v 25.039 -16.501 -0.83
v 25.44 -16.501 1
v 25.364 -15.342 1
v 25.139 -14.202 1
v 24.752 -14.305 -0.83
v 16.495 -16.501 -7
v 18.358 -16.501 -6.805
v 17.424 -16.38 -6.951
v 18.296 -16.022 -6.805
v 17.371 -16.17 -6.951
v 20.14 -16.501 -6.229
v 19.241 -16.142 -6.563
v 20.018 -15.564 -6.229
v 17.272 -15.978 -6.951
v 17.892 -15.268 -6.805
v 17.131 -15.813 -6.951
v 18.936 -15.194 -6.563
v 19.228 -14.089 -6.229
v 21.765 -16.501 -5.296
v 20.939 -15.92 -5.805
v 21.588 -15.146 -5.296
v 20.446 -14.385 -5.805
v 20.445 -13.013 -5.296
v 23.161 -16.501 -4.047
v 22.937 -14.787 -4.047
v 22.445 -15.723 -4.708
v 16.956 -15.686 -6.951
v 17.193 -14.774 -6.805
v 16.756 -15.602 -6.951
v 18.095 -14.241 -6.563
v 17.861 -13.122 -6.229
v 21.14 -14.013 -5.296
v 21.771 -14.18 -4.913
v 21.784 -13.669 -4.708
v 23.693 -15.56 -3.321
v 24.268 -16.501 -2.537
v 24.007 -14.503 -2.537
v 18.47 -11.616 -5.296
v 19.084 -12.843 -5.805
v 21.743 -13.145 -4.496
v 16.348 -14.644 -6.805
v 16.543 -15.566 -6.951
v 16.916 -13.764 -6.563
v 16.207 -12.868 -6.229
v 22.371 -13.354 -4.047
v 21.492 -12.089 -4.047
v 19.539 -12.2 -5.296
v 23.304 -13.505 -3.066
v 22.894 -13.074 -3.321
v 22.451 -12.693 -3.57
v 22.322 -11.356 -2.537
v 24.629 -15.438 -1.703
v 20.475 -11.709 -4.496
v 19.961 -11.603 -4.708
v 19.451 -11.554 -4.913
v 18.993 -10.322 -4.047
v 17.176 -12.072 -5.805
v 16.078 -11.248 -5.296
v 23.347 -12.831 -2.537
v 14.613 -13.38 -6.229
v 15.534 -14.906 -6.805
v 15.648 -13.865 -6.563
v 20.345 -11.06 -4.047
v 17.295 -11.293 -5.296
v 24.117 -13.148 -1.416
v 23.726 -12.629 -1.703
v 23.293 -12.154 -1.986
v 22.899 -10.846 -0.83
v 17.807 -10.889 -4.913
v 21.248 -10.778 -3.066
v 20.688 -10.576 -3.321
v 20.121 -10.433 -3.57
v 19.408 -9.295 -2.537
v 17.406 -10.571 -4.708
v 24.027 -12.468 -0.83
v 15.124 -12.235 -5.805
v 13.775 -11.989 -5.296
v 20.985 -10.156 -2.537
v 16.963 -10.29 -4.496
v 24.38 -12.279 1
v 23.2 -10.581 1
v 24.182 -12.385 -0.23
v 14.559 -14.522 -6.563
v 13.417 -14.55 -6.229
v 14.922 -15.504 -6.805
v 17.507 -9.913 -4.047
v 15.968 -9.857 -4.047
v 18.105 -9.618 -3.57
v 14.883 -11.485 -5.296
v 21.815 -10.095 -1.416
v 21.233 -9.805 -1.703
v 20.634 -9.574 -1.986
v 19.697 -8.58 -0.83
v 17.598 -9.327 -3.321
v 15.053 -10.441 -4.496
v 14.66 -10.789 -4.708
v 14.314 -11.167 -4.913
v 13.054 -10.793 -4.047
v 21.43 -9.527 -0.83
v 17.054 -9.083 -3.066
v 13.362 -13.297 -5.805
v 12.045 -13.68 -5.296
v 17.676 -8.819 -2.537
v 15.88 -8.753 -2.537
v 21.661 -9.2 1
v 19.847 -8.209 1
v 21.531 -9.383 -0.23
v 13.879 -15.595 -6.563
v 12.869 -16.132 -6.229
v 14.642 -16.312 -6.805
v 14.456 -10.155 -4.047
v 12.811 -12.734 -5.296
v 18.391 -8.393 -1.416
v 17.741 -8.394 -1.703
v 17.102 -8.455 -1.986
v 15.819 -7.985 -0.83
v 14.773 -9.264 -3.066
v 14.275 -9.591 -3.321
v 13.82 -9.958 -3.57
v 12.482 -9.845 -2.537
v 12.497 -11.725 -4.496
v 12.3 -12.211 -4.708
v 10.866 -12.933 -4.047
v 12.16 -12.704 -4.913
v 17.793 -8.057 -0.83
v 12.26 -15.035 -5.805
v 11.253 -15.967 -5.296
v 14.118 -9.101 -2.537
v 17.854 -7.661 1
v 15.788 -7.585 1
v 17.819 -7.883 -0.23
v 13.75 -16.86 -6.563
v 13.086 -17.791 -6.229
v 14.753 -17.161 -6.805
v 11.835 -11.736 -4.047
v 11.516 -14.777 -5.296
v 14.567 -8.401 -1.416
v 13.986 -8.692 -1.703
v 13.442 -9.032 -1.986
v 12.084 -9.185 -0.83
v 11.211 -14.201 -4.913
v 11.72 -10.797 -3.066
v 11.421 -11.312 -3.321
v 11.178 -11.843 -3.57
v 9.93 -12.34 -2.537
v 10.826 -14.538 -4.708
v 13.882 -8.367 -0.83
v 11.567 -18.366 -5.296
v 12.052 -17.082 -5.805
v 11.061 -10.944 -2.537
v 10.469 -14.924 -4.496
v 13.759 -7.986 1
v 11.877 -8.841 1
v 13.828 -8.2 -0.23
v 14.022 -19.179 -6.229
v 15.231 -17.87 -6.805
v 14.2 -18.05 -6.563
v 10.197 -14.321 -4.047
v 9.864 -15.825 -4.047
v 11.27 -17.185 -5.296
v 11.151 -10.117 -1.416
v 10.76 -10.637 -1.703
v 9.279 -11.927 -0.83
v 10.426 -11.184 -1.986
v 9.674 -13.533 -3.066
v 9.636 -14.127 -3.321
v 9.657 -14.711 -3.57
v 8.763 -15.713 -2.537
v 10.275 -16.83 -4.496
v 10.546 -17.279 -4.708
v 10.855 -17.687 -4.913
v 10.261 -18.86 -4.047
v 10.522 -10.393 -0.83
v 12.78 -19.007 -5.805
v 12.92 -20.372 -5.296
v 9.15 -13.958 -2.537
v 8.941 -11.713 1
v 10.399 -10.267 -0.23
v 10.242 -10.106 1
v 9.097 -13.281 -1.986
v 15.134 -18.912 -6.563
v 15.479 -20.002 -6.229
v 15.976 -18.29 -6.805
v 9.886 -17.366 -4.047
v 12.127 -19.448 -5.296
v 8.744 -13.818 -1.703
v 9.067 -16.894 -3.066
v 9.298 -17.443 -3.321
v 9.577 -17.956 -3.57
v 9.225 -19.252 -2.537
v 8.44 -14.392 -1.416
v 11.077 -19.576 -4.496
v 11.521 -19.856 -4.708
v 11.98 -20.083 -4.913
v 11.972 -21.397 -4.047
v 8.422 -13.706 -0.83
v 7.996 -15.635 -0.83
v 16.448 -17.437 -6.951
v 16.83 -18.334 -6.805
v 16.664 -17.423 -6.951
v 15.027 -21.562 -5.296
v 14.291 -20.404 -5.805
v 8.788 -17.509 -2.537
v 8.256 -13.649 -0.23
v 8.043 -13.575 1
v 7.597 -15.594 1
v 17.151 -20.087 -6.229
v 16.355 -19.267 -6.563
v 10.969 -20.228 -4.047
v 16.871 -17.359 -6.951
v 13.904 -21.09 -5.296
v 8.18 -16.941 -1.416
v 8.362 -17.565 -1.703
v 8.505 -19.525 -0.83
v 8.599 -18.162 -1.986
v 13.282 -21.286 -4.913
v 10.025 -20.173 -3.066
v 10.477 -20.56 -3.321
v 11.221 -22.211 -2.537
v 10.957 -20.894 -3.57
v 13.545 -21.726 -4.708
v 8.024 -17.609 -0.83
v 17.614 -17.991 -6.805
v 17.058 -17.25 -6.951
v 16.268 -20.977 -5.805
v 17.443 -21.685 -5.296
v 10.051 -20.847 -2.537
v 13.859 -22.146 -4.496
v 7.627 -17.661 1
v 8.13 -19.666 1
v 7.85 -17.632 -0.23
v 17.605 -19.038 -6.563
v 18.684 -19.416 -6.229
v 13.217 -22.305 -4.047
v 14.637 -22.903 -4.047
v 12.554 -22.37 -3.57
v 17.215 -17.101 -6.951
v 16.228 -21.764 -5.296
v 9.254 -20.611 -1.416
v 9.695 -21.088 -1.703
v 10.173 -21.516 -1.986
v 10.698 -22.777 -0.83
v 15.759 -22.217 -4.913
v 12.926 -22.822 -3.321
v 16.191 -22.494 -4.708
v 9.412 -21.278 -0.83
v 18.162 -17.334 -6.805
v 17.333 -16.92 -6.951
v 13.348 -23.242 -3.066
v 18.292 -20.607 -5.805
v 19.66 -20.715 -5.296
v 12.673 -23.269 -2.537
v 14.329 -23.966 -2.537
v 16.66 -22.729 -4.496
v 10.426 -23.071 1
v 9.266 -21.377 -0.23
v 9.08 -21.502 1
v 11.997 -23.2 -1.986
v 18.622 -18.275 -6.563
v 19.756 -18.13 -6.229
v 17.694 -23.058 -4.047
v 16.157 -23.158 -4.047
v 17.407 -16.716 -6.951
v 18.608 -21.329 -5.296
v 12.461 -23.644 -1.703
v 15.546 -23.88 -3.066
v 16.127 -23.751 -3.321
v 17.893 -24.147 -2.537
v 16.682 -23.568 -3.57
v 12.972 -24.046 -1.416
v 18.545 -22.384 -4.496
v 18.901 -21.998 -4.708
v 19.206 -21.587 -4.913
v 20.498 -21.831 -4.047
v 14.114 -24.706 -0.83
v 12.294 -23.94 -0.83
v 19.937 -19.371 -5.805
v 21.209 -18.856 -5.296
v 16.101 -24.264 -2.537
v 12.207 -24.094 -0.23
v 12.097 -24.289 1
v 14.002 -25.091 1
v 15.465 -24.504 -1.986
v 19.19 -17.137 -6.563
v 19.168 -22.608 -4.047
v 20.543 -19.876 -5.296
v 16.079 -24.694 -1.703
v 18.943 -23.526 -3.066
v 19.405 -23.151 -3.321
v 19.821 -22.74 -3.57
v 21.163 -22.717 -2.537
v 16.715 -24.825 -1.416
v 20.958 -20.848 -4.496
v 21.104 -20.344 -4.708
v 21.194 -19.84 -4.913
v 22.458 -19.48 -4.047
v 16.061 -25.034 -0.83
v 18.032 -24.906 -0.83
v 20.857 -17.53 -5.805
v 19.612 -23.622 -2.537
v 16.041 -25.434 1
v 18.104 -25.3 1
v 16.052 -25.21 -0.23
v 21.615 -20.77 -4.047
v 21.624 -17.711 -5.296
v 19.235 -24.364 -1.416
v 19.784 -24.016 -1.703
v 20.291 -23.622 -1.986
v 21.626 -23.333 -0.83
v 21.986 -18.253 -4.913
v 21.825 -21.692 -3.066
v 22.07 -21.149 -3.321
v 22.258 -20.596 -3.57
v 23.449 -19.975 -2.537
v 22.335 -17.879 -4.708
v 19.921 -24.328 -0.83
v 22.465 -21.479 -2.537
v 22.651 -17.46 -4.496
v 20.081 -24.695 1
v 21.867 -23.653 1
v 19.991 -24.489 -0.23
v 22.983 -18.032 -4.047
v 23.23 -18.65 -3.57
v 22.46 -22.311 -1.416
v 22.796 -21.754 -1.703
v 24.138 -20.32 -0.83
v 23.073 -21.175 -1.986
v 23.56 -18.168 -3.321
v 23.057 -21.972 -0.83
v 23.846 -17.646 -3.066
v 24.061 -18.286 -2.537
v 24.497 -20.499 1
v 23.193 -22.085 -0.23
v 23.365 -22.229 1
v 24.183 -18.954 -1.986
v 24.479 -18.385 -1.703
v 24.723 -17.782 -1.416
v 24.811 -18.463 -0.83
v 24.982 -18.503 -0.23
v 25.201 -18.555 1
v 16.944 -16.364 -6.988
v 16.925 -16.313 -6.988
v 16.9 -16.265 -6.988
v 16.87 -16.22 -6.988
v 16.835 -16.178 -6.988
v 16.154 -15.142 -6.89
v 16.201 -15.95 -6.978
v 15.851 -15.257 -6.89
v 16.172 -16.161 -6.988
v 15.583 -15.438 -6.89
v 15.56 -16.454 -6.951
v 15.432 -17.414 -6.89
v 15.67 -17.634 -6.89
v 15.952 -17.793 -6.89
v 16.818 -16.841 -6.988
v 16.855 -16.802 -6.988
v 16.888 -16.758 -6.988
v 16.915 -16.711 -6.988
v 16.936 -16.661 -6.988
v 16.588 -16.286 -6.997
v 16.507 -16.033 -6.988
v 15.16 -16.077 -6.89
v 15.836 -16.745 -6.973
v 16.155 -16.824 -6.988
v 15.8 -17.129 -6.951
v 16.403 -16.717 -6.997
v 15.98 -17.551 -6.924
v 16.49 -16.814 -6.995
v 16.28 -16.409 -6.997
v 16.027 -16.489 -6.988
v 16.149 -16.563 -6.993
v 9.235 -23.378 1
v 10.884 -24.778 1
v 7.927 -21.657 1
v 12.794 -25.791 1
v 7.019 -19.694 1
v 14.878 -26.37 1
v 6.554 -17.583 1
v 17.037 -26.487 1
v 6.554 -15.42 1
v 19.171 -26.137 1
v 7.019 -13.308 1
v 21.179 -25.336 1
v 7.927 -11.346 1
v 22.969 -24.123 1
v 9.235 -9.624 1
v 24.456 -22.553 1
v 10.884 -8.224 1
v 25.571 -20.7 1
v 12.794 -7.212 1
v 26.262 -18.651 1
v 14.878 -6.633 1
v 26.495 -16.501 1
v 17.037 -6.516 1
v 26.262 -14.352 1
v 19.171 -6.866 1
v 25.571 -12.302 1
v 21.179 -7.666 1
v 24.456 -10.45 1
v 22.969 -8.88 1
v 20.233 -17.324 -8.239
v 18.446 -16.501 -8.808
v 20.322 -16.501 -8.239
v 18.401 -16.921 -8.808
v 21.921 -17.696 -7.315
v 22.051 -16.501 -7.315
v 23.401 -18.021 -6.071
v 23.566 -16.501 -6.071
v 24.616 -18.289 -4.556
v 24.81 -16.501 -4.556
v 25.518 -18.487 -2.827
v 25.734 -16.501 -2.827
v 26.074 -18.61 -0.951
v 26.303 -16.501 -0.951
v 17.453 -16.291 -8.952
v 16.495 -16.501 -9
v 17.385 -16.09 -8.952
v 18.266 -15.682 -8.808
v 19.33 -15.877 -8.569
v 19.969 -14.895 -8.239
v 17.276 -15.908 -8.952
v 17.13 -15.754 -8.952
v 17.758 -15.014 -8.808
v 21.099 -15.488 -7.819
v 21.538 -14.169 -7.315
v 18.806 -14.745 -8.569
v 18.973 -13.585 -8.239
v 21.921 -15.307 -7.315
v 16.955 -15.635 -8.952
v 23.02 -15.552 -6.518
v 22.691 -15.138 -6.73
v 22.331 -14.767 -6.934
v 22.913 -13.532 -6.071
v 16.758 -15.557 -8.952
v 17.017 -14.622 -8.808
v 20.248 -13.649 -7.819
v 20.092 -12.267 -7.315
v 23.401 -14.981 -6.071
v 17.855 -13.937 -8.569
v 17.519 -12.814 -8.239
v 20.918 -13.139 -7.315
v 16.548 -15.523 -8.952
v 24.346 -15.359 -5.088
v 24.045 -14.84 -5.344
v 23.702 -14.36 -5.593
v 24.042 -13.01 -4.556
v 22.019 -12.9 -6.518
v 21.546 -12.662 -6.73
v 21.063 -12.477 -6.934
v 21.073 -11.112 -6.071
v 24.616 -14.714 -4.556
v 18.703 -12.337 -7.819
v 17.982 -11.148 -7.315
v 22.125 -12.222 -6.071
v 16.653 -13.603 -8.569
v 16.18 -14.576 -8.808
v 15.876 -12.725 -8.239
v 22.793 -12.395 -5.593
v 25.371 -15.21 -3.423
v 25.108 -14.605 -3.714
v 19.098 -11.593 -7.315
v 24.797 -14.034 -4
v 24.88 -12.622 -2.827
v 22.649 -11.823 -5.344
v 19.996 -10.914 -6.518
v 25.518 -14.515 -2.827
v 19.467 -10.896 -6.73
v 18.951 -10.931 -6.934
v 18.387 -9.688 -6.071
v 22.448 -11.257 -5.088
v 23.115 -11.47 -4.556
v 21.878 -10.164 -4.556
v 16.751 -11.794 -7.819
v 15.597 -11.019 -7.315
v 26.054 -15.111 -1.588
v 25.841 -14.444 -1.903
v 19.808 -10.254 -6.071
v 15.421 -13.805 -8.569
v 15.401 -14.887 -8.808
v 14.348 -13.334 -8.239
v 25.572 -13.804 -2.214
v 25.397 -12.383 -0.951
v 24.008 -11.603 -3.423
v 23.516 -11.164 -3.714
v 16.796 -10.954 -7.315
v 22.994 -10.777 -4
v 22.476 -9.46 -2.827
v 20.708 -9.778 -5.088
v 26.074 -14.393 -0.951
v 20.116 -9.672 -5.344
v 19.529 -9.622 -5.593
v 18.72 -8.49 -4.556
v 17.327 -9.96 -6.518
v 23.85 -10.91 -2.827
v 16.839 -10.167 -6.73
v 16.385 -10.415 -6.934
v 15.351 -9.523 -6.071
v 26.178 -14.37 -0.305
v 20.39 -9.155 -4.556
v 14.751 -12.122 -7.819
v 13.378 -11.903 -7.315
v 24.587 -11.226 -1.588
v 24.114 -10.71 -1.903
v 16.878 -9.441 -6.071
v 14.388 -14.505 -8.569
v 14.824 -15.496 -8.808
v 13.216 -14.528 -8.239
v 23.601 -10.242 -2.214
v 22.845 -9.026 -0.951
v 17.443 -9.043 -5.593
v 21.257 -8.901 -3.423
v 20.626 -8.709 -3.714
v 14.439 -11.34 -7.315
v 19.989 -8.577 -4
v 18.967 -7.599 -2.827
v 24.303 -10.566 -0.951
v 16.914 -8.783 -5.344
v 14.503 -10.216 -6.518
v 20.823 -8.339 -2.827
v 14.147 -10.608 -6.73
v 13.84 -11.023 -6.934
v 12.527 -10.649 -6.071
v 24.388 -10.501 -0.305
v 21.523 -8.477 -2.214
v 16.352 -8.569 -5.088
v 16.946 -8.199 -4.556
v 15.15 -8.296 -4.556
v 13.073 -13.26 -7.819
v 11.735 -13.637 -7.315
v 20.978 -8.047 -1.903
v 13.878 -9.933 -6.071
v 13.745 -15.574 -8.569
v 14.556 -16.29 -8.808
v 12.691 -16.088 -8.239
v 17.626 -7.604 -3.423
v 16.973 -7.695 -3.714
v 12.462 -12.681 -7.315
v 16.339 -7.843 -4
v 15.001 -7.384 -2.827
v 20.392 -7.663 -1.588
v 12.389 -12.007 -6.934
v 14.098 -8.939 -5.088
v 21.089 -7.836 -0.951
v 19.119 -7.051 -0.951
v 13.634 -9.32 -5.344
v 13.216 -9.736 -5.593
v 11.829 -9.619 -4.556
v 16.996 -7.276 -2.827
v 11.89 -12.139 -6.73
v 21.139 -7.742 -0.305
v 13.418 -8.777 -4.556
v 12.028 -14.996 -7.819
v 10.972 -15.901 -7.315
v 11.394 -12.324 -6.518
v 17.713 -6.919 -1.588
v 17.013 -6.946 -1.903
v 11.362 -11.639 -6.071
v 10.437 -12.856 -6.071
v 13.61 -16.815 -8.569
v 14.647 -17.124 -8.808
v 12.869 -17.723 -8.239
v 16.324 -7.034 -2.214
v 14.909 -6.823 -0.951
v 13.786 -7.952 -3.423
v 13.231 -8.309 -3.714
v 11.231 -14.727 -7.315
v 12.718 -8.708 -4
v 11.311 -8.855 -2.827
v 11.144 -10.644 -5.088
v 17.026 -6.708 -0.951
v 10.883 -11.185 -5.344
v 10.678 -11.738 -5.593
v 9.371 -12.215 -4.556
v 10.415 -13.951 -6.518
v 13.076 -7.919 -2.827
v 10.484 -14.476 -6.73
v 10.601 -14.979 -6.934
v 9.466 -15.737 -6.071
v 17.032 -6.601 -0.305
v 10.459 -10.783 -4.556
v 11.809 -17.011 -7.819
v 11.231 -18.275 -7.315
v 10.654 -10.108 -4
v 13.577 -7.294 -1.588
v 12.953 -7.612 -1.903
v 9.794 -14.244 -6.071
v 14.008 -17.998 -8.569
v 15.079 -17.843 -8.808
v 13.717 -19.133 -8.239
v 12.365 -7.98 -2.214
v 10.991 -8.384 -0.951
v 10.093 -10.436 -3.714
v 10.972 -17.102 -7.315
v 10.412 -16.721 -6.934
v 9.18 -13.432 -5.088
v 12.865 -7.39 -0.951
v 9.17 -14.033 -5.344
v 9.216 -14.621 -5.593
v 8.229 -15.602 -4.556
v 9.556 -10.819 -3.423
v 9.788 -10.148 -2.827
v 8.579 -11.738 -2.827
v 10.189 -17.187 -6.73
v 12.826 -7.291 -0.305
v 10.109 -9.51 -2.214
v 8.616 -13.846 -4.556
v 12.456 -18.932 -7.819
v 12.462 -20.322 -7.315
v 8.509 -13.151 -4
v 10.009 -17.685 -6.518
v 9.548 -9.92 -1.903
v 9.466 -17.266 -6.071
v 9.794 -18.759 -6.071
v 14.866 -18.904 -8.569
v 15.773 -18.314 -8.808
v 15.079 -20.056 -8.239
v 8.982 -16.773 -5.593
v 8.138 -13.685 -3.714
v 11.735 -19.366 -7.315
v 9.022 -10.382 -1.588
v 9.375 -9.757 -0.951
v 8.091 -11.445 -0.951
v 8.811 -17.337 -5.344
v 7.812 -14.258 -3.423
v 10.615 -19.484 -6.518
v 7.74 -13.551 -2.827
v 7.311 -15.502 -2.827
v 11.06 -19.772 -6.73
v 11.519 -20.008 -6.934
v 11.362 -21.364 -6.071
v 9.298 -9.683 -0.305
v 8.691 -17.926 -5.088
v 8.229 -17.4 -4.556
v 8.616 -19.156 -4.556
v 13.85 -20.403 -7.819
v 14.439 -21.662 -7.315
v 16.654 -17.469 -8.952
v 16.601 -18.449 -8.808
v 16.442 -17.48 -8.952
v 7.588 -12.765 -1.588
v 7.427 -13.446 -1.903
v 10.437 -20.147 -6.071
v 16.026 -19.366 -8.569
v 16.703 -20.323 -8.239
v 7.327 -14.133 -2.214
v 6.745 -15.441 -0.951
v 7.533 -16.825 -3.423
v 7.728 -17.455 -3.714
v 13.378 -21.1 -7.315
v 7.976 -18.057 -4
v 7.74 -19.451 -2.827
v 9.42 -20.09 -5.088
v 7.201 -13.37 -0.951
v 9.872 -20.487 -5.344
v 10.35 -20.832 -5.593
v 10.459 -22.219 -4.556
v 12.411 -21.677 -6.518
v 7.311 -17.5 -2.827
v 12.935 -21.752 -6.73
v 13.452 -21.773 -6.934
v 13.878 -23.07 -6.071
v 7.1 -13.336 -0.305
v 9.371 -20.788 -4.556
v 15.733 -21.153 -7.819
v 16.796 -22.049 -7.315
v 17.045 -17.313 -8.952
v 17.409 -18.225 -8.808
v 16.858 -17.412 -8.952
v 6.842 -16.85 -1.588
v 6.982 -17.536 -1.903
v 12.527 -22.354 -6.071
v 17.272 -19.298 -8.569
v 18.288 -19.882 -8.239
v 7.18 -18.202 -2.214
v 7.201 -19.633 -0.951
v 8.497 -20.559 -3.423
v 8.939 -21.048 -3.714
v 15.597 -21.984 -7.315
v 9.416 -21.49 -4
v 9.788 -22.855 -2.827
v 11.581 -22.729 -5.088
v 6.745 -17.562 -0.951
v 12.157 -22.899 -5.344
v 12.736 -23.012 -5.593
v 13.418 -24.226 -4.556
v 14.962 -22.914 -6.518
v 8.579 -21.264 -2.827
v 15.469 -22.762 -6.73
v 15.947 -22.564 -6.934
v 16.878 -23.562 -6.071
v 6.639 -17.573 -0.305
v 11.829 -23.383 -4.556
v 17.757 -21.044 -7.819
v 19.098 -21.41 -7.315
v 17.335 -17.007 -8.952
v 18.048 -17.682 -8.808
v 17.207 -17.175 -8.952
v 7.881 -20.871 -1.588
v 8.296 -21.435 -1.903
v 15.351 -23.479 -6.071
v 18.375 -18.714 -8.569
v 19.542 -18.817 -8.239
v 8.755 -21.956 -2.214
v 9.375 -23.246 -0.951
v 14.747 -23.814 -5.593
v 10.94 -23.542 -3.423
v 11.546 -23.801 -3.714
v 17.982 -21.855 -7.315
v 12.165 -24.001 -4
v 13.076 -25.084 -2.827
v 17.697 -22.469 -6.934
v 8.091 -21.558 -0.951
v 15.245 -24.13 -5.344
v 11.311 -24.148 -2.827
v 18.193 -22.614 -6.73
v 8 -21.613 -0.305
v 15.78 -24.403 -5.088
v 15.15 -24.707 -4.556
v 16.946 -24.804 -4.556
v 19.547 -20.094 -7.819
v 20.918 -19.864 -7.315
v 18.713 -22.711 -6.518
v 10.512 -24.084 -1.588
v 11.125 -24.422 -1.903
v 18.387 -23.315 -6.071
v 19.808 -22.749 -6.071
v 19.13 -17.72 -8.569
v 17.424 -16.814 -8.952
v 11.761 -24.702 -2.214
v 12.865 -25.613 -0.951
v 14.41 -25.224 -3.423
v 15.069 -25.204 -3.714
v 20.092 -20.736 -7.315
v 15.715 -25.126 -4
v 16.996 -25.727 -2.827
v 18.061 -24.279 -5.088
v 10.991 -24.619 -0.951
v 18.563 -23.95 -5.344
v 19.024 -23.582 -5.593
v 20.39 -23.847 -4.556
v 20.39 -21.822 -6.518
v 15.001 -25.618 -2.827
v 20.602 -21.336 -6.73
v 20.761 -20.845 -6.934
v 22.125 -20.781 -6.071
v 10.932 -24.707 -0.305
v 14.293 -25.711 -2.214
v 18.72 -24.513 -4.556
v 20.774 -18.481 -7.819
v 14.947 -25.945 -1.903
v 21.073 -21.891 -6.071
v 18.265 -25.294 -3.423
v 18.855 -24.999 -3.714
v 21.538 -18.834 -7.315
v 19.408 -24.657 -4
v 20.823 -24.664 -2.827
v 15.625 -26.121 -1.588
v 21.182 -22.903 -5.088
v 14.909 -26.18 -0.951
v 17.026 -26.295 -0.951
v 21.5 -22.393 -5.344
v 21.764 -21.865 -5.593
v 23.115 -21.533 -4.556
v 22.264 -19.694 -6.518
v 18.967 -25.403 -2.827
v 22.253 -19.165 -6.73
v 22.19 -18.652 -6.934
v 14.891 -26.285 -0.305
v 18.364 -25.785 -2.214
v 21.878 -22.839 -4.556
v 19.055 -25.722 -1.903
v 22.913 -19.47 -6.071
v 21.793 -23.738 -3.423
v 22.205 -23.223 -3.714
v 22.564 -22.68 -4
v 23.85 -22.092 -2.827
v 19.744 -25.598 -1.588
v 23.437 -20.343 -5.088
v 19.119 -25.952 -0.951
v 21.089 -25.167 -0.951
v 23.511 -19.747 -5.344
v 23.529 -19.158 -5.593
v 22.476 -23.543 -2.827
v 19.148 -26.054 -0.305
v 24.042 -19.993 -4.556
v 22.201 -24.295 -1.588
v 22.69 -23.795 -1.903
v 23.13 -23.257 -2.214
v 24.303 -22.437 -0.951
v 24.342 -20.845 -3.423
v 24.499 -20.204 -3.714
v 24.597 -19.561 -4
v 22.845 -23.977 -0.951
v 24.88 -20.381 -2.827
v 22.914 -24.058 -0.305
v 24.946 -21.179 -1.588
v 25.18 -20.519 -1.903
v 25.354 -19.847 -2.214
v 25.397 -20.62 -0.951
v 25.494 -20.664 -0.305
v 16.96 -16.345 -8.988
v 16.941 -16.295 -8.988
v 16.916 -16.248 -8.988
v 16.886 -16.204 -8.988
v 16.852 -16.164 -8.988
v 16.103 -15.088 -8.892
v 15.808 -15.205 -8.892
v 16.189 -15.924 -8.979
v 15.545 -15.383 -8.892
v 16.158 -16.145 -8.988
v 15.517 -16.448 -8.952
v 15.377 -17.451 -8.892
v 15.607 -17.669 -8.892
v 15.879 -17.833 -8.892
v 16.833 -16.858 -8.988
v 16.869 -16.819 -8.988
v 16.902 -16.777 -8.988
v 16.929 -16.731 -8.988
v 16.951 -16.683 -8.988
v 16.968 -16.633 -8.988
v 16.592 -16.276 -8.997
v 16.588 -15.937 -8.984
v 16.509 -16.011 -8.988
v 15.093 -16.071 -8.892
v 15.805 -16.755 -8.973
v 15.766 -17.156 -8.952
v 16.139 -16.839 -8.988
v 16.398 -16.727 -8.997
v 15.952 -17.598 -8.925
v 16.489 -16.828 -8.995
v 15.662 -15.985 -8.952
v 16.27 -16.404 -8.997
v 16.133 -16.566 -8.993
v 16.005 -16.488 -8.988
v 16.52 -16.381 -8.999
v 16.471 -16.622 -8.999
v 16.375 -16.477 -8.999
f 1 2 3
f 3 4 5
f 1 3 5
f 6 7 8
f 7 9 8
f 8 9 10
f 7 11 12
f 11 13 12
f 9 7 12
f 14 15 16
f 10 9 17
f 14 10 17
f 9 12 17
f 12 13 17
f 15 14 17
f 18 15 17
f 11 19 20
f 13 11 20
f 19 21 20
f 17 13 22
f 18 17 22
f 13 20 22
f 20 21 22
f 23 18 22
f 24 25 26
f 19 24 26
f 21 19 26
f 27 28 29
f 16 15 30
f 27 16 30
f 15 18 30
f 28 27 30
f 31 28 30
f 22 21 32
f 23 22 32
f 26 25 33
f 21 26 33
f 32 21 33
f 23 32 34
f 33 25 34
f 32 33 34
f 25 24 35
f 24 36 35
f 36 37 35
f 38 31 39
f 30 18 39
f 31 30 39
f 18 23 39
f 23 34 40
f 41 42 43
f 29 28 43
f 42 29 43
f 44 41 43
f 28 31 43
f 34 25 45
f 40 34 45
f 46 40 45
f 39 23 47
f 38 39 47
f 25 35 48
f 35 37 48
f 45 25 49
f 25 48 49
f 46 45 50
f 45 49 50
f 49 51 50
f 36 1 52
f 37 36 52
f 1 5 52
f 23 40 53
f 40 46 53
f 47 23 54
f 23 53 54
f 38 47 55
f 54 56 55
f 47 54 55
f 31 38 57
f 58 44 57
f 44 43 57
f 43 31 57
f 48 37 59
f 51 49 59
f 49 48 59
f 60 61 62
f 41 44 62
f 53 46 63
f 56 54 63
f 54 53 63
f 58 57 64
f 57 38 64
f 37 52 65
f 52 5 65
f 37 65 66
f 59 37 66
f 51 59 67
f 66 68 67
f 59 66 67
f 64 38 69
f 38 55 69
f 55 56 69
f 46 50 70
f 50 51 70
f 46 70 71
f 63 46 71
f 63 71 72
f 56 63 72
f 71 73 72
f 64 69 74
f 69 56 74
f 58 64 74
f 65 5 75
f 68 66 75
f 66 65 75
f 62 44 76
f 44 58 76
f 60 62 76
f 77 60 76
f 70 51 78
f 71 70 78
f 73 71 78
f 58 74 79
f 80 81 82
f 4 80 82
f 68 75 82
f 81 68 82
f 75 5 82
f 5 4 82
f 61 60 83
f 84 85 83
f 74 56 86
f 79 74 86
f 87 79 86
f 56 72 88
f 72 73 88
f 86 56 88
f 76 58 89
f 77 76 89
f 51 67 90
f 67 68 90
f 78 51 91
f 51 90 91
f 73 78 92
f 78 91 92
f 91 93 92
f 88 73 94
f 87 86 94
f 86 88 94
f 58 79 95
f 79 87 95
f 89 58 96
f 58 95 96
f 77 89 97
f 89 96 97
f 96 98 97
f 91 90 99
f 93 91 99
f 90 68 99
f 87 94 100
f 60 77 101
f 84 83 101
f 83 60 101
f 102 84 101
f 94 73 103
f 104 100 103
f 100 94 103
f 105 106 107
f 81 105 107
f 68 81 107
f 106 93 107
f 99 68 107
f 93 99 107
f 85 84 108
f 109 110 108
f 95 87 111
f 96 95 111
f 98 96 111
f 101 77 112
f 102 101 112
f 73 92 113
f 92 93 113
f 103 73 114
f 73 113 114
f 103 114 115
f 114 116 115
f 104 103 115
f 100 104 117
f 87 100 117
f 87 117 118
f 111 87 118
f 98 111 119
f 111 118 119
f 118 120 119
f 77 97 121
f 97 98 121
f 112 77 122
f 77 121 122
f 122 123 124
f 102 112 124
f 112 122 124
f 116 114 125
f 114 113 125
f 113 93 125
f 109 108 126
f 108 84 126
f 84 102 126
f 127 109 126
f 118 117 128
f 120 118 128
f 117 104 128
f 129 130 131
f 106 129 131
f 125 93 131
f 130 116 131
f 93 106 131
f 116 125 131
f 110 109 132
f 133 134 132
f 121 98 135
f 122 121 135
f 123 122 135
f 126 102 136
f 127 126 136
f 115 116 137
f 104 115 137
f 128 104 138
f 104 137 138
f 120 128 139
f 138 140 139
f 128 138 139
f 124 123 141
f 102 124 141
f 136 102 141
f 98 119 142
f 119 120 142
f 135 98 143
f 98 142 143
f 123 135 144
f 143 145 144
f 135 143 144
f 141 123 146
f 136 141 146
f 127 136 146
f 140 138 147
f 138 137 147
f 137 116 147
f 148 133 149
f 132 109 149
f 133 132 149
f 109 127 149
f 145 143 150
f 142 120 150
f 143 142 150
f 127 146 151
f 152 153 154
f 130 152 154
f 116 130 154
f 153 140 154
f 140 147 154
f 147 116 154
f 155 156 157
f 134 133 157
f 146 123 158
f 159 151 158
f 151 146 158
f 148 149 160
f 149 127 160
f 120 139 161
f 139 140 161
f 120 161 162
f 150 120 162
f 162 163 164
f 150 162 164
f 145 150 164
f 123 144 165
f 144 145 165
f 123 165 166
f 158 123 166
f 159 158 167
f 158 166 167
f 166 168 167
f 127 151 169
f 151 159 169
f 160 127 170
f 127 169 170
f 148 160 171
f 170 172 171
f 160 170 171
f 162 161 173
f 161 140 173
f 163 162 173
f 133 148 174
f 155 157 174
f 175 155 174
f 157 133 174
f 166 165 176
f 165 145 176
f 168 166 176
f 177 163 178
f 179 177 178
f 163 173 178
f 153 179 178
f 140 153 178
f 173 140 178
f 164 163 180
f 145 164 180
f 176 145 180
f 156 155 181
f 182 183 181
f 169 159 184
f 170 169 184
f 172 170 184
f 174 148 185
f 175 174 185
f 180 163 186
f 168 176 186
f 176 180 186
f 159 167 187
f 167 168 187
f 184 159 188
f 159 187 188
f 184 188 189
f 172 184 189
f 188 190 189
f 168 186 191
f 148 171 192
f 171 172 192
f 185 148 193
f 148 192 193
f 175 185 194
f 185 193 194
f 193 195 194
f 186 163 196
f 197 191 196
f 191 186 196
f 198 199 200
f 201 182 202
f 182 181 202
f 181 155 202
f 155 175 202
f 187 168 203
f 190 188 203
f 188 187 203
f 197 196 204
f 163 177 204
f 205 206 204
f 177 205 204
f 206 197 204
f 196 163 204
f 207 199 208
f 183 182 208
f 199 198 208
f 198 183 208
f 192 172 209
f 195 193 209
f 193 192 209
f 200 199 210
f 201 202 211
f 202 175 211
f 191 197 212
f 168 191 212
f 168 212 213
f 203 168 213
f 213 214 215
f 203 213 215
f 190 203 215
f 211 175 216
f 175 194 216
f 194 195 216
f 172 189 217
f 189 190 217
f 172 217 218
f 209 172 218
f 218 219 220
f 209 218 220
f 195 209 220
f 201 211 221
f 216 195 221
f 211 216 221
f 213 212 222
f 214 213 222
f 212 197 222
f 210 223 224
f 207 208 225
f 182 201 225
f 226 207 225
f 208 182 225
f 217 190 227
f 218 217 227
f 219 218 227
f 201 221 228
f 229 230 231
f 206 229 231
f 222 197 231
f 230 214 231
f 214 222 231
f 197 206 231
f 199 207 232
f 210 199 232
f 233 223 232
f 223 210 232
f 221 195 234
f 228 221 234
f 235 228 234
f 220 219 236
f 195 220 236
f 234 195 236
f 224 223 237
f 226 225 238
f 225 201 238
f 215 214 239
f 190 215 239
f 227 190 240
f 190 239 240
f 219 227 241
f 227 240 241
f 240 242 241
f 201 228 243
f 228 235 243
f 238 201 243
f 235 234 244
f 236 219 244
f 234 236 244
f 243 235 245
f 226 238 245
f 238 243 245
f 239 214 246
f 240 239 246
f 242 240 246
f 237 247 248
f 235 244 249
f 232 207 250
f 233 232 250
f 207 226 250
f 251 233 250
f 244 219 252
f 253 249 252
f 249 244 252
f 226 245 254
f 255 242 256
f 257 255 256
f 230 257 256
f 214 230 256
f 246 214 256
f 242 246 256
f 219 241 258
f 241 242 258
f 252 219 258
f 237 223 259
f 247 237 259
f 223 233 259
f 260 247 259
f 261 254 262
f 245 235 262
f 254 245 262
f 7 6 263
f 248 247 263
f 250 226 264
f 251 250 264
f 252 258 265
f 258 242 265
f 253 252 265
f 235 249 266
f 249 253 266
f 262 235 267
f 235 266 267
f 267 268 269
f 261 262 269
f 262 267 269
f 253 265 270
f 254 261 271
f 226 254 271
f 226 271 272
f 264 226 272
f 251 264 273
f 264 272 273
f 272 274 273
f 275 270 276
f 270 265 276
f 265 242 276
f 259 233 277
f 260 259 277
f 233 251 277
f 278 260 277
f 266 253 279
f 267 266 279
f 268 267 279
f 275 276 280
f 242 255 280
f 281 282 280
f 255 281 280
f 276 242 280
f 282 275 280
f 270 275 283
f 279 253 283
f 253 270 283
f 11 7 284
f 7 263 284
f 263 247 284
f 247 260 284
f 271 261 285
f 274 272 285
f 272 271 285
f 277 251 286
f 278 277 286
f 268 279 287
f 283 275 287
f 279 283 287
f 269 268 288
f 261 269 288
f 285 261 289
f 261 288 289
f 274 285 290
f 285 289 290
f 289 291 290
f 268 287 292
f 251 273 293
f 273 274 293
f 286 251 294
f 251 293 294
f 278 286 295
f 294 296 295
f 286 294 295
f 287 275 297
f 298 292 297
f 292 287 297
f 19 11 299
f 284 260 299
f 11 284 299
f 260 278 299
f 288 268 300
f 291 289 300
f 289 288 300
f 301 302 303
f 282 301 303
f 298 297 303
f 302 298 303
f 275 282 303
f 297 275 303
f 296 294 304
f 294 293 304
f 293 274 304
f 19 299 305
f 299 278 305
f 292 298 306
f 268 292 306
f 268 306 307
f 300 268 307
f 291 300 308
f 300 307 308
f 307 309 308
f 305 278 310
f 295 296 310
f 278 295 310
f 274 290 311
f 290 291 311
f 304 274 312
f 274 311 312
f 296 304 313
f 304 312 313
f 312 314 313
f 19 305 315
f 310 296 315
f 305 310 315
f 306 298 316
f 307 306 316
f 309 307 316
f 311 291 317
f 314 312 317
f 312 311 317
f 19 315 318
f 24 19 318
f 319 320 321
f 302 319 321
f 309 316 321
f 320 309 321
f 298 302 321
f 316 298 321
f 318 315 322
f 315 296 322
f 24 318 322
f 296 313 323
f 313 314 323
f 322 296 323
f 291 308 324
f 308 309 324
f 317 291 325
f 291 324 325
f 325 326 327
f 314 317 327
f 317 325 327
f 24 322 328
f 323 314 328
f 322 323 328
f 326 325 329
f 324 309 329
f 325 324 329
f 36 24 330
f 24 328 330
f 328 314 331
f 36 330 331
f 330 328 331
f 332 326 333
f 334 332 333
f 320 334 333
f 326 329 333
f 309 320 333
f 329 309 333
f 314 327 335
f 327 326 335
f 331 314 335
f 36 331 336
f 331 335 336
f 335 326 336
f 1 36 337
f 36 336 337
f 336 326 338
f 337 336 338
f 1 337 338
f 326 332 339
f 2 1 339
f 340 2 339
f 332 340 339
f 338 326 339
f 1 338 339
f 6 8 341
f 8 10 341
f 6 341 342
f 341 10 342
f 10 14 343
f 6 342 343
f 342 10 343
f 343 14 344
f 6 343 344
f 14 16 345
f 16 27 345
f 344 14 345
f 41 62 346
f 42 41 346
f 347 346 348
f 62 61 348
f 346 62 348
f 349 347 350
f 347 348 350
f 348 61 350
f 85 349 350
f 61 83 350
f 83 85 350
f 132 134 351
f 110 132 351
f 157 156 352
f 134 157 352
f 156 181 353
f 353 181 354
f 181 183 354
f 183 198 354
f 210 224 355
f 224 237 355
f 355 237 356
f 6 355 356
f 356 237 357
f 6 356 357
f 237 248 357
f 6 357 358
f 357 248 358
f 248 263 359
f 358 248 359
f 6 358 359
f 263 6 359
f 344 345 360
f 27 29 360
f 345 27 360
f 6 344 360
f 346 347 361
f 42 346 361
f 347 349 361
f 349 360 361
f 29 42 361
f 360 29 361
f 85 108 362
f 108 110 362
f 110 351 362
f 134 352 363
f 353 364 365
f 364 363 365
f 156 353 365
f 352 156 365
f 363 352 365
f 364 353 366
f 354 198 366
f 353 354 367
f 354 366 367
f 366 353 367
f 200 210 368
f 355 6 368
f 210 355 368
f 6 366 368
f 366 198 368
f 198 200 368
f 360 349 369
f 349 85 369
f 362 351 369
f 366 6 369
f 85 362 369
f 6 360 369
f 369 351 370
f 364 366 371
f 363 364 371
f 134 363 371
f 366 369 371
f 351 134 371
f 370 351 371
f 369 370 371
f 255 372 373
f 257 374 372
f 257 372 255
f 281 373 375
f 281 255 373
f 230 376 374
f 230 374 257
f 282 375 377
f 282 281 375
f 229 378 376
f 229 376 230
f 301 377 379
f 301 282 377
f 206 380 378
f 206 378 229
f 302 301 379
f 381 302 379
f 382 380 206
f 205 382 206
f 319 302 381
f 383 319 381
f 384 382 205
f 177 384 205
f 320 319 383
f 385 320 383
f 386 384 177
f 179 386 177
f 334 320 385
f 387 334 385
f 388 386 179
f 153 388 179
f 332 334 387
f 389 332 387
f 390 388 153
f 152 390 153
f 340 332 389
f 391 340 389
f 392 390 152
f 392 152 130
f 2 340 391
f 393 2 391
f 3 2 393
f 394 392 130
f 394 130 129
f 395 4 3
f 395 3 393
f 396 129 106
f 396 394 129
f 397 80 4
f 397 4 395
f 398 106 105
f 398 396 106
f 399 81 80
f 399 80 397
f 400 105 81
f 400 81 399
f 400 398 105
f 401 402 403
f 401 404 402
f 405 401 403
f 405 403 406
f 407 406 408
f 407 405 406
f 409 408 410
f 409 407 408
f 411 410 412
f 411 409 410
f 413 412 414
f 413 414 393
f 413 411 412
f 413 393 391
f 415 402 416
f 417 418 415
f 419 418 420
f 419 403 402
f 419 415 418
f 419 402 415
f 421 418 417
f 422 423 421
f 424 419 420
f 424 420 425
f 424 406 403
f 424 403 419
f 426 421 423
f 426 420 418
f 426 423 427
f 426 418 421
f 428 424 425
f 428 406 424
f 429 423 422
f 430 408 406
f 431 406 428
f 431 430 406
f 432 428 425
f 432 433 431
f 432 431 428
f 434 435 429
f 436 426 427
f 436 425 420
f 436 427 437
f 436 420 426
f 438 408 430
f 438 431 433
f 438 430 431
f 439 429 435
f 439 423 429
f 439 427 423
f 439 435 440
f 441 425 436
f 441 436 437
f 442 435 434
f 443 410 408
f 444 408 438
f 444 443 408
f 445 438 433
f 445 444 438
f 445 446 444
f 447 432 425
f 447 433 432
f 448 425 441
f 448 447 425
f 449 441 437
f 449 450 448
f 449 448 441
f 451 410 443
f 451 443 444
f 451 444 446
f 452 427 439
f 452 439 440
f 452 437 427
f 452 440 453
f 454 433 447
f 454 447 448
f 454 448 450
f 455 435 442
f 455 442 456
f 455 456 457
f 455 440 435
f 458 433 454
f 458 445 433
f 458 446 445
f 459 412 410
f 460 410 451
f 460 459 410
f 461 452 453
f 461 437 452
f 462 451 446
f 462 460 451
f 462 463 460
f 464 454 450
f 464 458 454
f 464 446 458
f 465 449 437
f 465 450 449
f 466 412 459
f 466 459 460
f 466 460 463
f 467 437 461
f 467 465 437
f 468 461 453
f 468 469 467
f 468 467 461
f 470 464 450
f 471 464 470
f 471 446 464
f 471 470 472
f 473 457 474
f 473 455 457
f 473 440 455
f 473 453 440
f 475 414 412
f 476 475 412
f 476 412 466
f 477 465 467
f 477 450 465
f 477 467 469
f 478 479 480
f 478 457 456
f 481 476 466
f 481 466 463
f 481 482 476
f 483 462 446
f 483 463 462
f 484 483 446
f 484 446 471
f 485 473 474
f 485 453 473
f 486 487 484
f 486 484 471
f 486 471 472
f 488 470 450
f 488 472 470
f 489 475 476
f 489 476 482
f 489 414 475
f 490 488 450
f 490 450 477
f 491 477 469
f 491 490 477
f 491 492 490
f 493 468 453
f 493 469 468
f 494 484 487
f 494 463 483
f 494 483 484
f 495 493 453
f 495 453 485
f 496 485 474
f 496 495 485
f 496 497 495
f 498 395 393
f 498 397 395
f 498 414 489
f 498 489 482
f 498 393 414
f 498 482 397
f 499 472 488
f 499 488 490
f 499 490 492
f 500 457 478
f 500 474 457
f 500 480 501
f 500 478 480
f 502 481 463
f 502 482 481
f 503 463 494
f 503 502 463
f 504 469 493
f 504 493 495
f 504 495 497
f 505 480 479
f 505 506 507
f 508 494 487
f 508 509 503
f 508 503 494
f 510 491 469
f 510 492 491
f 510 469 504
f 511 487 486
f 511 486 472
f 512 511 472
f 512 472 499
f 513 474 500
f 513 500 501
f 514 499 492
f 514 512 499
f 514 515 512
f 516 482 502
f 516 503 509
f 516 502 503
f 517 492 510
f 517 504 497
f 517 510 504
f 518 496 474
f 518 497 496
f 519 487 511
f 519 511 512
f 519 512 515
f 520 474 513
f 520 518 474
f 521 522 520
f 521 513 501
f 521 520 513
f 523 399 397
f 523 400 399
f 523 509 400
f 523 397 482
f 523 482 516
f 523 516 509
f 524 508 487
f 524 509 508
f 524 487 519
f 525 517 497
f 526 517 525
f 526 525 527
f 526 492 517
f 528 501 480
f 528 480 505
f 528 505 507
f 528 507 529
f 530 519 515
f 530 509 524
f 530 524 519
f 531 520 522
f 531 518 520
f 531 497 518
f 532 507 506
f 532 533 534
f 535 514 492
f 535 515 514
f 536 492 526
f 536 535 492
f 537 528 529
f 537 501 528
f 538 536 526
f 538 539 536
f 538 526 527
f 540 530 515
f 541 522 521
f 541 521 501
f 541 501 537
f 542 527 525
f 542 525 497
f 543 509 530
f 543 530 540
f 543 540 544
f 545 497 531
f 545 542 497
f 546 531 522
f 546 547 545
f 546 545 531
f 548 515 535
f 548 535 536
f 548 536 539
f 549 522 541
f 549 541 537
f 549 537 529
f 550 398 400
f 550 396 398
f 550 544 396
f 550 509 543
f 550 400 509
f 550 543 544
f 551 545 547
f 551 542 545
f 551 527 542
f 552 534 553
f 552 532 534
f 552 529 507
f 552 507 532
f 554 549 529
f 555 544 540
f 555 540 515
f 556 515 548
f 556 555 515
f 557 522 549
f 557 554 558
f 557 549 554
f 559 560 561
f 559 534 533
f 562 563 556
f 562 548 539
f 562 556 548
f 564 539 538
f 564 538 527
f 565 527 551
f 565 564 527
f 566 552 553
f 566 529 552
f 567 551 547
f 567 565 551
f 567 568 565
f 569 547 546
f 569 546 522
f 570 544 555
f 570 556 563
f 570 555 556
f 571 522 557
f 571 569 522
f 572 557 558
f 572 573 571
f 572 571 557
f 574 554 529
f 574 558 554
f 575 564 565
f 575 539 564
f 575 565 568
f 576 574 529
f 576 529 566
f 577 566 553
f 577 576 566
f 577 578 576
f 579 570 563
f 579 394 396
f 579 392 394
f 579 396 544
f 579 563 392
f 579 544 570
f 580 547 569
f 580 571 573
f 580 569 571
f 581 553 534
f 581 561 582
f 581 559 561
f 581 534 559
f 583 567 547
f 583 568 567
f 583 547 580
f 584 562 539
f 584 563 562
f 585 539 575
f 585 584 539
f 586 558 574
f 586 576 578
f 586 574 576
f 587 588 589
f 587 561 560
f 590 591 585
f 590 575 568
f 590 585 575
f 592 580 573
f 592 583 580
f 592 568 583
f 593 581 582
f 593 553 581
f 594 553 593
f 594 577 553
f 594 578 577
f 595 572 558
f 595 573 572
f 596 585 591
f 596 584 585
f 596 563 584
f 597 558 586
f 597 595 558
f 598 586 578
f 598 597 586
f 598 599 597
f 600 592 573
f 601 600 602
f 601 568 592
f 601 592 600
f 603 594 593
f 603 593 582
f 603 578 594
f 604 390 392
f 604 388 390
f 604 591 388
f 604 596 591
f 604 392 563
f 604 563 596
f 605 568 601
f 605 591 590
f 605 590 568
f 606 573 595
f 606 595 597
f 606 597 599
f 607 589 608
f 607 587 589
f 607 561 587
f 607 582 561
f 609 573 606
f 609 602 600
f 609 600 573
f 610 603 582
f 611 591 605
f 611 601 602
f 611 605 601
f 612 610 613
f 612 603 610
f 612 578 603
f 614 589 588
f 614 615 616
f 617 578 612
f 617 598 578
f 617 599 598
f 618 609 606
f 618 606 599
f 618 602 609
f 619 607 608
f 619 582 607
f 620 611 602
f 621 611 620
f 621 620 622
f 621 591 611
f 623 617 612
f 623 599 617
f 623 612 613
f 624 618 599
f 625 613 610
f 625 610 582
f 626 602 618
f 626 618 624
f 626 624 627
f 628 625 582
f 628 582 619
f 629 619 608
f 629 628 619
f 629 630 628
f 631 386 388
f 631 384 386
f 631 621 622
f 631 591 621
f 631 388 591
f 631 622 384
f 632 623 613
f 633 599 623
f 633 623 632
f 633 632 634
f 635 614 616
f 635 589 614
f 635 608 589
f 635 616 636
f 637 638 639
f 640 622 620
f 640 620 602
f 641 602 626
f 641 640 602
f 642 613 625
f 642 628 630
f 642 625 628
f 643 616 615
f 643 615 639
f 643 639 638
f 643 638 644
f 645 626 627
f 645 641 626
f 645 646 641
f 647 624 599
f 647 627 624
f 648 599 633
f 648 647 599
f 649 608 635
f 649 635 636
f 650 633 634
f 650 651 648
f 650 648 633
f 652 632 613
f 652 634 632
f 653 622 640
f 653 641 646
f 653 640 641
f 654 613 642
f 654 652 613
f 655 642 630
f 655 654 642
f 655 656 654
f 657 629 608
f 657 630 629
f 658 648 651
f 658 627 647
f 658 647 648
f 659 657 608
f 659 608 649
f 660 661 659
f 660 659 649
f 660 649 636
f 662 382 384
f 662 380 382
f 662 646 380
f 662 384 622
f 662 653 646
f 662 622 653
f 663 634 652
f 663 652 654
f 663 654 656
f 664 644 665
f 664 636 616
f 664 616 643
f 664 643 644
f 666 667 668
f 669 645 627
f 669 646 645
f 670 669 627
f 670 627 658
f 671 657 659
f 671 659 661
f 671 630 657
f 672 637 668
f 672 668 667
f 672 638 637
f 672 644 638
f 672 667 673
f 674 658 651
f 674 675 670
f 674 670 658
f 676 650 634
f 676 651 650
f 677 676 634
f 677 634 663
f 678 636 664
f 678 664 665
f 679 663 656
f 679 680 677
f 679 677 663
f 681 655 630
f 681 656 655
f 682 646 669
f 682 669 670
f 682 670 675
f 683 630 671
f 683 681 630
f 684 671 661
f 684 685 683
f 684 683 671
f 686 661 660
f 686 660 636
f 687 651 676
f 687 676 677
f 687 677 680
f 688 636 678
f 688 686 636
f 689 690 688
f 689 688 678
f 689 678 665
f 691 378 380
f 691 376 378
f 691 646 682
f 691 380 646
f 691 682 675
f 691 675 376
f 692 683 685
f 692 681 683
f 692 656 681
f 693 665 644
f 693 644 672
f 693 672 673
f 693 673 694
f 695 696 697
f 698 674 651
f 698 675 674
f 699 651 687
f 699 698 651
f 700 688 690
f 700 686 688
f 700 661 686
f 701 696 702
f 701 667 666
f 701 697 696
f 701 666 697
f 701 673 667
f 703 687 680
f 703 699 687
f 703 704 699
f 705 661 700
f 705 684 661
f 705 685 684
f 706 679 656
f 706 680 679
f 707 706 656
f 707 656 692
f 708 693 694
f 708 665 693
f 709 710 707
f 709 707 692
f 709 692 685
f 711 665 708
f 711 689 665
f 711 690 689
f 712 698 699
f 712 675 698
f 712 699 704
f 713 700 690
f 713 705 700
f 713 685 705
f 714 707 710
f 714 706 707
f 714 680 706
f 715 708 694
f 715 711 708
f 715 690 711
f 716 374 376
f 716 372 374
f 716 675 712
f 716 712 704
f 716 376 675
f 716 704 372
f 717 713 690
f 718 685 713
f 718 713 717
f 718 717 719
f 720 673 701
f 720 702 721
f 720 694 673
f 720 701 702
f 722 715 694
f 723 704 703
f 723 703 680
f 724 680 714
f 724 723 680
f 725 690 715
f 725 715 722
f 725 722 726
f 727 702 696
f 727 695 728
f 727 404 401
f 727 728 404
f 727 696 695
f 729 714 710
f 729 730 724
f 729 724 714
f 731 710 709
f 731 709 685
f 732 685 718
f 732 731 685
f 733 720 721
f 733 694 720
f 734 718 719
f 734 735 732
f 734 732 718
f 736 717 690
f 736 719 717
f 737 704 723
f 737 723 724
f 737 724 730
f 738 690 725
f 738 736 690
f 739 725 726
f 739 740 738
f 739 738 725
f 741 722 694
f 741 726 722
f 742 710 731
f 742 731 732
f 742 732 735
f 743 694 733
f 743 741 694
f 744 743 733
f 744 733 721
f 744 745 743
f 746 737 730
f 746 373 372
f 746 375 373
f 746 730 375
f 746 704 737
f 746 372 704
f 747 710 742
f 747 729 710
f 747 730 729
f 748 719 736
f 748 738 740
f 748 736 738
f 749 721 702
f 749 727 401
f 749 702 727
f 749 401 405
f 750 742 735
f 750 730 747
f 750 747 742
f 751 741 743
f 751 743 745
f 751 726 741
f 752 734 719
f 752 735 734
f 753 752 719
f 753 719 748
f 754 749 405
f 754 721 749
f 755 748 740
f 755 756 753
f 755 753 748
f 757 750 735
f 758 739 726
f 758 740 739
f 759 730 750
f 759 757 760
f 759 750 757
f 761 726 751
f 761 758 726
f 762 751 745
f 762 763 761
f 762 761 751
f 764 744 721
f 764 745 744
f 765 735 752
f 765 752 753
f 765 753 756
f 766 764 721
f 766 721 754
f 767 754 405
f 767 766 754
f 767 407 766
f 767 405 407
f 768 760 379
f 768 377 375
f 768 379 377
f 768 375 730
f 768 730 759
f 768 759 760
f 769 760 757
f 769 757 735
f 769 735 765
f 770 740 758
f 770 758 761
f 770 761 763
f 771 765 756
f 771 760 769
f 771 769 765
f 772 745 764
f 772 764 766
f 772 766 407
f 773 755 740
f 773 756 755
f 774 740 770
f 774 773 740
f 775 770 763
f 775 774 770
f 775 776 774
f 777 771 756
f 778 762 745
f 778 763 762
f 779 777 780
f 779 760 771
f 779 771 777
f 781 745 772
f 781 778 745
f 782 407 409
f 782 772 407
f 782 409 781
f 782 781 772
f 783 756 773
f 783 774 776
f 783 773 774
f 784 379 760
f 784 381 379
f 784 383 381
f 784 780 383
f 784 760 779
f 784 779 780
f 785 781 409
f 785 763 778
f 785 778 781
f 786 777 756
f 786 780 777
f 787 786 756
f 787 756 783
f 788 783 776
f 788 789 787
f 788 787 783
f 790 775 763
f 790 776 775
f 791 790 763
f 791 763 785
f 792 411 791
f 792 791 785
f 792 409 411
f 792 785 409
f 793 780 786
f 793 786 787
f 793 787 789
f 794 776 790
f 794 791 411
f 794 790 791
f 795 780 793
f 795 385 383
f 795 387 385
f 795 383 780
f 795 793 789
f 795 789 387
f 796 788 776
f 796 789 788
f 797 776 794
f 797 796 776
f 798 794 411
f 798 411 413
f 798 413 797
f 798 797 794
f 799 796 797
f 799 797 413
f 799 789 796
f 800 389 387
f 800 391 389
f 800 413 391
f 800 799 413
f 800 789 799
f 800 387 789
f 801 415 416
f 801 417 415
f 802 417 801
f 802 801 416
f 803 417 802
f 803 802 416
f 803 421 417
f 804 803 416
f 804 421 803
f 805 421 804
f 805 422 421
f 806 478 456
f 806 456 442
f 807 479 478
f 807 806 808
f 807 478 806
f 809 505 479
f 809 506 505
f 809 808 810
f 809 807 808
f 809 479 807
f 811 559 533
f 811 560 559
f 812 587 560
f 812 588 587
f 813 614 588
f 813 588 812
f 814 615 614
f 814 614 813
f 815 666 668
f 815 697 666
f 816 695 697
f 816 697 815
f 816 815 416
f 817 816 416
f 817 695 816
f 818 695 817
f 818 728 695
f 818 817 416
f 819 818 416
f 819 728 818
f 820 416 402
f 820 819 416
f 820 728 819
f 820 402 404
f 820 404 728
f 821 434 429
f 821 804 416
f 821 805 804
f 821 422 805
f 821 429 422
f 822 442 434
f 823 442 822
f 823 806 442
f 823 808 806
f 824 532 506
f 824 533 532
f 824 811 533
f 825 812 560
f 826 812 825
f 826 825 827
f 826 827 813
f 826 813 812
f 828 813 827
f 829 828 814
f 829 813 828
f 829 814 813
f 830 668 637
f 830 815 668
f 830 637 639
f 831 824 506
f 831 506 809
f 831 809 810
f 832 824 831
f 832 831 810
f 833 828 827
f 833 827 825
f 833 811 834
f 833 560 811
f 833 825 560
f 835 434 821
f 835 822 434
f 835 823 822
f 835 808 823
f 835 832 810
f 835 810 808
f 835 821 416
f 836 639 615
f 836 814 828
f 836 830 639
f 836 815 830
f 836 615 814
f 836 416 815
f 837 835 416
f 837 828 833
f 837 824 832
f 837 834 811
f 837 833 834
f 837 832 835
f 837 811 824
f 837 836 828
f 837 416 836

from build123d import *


with BuildPart() as sphere001:
    # Sphere001 → Sphere001 (revolve)
    with BuildSketch(Plane(origin=(16.5428, -16.9323, 1), x_dir=(1, 0, 0), z_dir=(0, -1, 0))):
        with BuildLine():
            ThreePointArc((0, -9), (6.363961, -6.363961), (9, 0))
            Line((9, 0), (0, 0))
            Line((0, 0), (0, -9))
        make_face()
    revolve(axis=Axis((16.5428, -16.9323, 1), (0, 0, 1)))


with BuildPart() as cut006:
    # Sphere → Sphere (revolve)
    with BuildSketch(Plane(origin=(16.542849, -16.932314, 0), x_dir=(1, 0, 0), z_dir=(0, -1, 0))):
        with BuildLine():
            ThreePointArc((0, -10), (7.071068, -7.071068), (10, 0))
            Line((10, 0), (0, 0))
            Line((0, 0), (0, -10))
        make_face()
    revolve(axis=Axis((16.542849, -16.932314, 0), (0, 0, 1)))

    # Cut006: cut Sphere001
    add(sphere001.part, mode=Mode.SUBTRACT)


with BuildPart() as cut006_1:
    # Cut006 placement: moved
    add(cut006.part.moved(Location((-0.04745, 0.430952, 1))))


solid = cut006_1.part
